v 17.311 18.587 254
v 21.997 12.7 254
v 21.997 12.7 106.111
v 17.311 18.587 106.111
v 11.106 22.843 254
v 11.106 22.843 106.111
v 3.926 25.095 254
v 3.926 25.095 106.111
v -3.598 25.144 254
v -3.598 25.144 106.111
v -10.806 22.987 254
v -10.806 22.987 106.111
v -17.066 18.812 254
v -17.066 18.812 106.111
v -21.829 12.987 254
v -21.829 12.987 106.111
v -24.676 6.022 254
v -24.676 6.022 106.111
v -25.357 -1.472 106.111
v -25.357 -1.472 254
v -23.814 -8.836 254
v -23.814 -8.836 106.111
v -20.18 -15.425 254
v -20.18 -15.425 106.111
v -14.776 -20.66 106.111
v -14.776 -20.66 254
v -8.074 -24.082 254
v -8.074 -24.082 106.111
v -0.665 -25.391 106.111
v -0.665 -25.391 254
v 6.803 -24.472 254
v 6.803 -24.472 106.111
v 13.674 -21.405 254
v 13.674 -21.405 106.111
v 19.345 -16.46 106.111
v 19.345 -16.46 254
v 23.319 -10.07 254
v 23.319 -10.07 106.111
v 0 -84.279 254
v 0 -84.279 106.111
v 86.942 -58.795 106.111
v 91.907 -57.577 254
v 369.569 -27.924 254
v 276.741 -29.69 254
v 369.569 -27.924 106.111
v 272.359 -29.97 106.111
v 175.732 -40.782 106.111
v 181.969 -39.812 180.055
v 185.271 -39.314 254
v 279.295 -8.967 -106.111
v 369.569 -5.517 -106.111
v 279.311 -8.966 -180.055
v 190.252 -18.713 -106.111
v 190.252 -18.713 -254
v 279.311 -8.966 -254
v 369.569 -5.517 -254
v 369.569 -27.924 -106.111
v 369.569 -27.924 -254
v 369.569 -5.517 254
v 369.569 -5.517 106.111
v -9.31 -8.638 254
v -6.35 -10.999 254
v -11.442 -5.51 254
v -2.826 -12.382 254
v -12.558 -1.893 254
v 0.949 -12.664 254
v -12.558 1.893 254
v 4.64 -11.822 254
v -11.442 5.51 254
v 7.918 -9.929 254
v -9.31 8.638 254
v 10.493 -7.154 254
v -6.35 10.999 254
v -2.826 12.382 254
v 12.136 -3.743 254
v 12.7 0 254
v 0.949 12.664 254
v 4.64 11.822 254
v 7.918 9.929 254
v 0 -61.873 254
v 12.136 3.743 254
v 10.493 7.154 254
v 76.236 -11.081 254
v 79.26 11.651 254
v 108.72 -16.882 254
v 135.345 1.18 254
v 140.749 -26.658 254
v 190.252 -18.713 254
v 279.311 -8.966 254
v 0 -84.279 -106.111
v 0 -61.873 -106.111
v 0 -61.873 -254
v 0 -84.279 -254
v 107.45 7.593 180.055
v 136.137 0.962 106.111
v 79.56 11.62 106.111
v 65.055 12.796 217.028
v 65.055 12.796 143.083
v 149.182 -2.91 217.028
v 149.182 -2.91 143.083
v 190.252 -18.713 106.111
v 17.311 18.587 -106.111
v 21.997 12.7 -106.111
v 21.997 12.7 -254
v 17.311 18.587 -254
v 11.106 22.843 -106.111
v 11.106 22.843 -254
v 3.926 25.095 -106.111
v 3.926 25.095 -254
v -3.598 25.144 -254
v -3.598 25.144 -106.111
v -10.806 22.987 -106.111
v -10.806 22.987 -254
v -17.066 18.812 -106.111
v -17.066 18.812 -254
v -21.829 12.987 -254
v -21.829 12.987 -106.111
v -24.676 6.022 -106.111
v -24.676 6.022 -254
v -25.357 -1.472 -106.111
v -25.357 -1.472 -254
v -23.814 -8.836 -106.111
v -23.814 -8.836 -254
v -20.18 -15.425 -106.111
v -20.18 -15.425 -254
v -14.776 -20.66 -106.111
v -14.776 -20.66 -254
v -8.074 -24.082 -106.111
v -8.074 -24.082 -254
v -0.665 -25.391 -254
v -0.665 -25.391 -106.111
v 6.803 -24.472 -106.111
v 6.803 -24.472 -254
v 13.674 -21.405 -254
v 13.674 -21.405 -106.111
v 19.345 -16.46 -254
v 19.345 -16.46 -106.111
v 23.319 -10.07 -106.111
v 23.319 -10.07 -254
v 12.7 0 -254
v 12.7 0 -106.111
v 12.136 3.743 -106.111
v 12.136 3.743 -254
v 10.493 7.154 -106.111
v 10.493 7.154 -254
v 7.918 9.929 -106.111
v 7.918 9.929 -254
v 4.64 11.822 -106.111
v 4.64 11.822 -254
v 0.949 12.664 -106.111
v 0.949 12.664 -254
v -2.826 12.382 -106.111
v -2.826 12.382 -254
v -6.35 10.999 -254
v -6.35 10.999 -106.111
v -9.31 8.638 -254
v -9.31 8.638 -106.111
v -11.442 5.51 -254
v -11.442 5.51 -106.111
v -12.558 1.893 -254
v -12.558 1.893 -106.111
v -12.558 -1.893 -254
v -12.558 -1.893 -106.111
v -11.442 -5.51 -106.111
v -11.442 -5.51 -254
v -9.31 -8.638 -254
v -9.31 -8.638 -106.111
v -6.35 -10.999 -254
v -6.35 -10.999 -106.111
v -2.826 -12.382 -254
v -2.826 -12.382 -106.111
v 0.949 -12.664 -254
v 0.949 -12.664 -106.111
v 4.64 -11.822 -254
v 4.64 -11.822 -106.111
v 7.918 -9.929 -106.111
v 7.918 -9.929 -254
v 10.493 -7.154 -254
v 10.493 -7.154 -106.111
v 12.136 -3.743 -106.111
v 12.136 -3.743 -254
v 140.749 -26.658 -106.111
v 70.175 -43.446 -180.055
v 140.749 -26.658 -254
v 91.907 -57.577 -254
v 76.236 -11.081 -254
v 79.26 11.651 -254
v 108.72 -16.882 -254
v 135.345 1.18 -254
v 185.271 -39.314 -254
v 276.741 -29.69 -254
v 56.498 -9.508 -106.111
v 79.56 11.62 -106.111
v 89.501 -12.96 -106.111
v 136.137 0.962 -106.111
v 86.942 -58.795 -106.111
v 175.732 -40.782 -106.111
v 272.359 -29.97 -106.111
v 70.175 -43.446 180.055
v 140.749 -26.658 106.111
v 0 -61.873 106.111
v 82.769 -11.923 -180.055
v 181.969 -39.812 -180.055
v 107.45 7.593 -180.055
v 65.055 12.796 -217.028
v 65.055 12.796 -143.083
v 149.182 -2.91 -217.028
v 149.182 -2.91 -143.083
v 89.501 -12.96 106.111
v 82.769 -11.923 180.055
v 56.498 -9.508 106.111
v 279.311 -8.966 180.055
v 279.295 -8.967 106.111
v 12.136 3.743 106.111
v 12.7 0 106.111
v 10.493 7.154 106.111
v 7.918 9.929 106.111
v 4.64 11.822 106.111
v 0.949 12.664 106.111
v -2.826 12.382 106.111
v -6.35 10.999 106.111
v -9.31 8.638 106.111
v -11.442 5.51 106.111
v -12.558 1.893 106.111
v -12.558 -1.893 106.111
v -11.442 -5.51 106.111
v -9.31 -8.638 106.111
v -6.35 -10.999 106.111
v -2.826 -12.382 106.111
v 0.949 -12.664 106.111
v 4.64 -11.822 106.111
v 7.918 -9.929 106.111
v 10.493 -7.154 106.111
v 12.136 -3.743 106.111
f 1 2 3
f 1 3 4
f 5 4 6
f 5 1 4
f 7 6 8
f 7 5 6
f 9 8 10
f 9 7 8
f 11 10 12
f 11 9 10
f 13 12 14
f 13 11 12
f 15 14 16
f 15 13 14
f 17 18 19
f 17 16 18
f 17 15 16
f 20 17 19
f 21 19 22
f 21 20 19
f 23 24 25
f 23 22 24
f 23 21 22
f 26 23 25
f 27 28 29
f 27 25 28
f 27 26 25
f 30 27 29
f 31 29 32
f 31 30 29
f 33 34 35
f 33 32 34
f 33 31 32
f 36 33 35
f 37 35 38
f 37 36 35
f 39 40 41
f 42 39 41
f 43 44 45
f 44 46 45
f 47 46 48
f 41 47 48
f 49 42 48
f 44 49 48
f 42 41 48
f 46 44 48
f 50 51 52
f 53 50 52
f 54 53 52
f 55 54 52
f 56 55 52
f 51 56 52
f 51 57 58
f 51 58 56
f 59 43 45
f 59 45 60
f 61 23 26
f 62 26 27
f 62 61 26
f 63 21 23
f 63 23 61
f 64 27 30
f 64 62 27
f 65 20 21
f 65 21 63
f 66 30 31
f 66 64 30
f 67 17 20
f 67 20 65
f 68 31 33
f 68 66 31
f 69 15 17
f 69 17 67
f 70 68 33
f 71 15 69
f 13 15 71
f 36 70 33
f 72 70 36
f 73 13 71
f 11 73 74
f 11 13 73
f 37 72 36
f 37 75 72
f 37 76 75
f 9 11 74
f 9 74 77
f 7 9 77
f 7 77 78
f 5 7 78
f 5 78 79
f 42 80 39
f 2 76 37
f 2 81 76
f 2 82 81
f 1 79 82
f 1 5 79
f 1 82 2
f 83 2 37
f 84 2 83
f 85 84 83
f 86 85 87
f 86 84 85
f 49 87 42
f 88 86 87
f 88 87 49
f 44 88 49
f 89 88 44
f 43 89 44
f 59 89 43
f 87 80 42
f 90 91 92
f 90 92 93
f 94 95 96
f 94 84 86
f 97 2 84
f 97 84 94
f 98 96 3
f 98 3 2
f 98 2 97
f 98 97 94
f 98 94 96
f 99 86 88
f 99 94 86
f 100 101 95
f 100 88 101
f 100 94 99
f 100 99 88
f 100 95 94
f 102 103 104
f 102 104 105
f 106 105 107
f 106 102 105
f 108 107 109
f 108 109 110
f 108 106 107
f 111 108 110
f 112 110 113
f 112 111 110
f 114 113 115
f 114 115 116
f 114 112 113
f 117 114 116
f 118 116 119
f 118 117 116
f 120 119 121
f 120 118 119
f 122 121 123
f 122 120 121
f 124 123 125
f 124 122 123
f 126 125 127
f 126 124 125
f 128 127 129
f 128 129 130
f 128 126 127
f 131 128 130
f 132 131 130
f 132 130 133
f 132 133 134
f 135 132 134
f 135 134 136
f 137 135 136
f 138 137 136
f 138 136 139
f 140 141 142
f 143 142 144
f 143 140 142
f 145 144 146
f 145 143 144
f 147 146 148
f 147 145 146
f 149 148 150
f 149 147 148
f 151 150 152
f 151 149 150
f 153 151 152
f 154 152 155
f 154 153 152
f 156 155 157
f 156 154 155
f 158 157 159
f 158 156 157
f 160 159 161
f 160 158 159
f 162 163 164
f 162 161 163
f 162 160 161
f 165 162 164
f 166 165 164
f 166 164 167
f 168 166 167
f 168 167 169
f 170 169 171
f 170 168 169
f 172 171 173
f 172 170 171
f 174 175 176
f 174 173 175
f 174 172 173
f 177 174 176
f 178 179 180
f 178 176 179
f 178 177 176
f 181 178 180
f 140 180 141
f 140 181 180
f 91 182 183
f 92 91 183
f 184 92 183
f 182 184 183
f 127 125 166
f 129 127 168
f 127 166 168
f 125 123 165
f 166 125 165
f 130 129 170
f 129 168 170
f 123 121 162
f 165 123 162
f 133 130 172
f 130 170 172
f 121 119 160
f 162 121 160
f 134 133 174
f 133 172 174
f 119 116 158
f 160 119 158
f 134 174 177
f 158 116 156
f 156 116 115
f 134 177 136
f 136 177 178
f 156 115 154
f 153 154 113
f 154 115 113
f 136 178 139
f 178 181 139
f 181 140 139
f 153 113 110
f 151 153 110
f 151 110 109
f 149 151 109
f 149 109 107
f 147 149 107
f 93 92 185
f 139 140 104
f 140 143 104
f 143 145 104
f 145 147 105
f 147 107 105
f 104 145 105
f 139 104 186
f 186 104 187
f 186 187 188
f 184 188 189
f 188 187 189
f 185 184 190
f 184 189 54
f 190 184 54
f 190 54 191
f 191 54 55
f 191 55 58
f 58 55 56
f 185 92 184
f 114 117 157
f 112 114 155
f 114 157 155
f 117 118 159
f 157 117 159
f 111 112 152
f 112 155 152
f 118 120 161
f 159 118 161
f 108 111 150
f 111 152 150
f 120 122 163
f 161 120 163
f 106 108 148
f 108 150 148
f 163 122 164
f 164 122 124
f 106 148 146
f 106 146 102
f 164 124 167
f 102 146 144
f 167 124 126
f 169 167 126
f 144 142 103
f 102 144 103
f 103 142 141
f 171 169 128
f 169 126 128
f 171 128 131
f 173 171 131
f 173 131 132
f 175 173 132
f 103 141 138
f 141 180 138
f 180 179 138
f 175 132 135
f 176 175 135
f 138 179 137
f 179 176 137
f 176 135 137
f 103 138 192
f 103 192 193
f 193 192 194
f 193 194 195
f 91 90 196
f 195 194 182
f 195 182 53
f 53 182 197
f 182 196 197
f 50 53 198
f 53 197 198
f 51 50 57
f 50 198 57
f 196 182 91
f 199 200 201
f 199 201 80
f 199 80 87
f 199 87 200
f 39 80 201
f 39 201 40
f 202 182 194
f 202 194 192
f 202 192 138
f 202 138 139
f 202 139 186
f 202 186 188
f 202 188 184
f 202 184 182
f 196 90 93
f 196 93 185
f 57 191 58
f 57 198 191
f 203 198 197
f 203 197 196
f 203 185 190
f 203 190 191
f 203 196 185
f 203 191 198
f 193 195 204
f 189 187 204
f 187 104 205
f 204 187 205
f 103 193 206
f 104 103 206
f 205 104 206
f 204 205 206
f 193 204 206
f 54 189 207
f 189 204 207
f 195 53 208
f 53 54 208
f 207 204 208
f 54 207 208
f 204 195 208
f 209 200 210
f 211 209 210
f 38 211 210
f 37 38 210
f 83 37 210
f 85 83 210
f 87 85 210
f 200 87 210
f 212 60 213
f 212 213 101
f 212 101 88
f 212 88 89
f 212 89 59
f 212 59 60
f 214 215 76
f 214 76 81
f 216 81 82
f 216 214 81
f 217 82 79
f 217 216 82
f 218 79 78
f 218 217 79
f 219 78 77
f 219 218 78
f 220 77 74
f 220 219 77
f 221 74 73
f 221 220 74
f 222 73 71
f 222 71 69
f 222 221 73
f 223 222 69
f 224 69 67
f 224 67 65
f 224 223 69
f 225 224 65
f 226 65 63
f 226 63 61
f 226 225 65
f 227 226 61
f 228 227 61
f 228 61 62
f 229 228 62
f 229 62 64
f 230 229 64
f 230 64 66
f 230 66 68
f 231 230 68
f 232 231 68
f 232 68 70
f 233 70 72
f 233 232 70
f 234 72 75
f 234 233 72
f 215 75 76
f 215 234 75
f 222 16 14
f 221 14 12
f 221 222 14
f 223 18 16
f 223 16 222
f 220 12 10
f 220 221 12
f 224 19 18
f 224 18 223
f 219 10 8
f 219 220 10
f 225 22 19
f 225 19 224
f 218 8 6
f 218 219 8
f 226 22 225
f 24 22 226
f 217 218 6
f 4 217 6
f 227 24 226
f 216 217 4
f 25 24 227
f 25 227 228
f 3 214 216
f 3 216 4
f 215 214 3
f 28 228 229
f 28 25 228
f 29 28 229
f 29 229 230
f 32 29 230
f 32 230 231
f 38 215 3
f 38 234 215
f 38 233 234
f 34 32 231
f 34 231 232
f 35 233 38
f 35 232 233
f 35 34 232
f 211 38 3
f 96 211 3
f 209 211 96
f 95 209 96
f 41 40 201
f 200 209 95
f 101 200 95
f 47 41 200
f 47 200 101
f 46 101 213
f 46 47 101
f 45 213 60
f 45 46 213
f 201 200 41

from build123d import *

# Parameters (mm, degrees)
SKETCH1_R               = 25.4
SKETCH1_R_2             = 12.7
BOSS_EXTRUDE1_DEPTH     = 254
BOSS_EXTRUDE2_DEPTH     = 254
CUT_EXTRUDE2_DEPTH      = 457.289621816
CUT_EXTRUDE2_DEPTH_BACK = 457.289621816
SKETCH4_W               = 419.69261594
SKETCH4_H               = 212.221573602


with BuildPart() as part:
    # Sketch1 → Boss-Extrude1 (new, symmetric)
    with BuildSketch(Plane.XY):
        Circle(SKETCH1_R)
        Circle(SKETCH1_R_2, mode=Mode.SUBTRACT)
    extrude(amount=BOSS_EXTRUDE1_DEPTH, both=True)

    # Sketch3 → Boss-Extrude2 (add, symmetric)
    with BuildSketch(Plane.XY):
        with BuildLine():
            Line((0, -61.872891468), (0, -84.279474595))
            add(Edge.make_bspline(
                [(0, -84.279474595), (179.154342515, -23.522142215), (369.568923203, -27.923523093)],
                knots=[0, 0, 0, 1, 1, 1], degree=2))
            Line((369.568923203, -27.923523093), (369.568923203, -5.516939966))
            add(Edge.make_bspline(
                [(190.2519953, -18.712944977), (278.712063384, -5.816566684), (369.568923203, -5.516939966)],
                knots=[0.521873105, 0.521873105, 0.521873105, 1, 1, 1], degree=2))
            add(Edge.make_bspline(
                [(21.997045256, 12.7), (108.775317236, 18.192473257), (190.2519953, -18.712944977)],
                knots=[0, 0, 0, 1, 1, 1], degree=2))
            ThreePointArc((21.997045256, 12.7), (25.357328272, 1.471700676), (23.318578458, -10.069950282))
            add(Edge.make_bspline(
                [(23.318578458, -10.069950282), (83.504990311, -5.482305261), (140.74929301, -26.657872419)],
                knots=[0, 0, 0, 1, 1, 1], degree=2))
            add(Edge.make_bspline(
                [(0, -61.872891468), (69.975789809, -42.626915469), (140.74929301, -26.657872419)],
                knots=[0, 0, 0, 1, 1, 1], degree=2))
        make_face()
    extrude(amount=BOSS_EXTRUDE2_DEPTH, both=True)

    # Sketch4 → Cut-Extrude2 (cut, two sides: drawn at the far end of the back side and taken through both)
    with BuildSketch(Plane(origin=(0, 0, 0), x_dir=(1, 0, 0), z_dir=(0, 1, 0)).offset(-CUT_EXTRUDE2_DEPTH_BACK)):
        with Locations((184.44630797, 0)):
            Rectangle(SKETCH4_W, SKETCH4_H)
    extrude(amount=CUT_EXTRUDE2_DEPTH + CUT_EXTRUDE2_DEPTH_BACK, mode=Mode.SUBTRACT)


with BuildPart() as cut_extrude2_piece_1:
    # of the separate pieces the step leaves, piece 1, a body of its own (cut_extrude2_pieces)
    add(part.part.solids().sort_by_distance((23.318578458, -10.069950282, -106.110786801))[0])


with BuildPart() as cut_extrude2_piece_2:
    # of the separate pieces the step leaves, piece 2, a body of its own (cut_extrude2_pieces)
    add(part.part.solids().sort_by_distance((21.997045256, 12.7, 106.110786801))[0])


solid = Compound([cut_extrude2_piece_1.part, cut_extrude2_piece_2.part])
